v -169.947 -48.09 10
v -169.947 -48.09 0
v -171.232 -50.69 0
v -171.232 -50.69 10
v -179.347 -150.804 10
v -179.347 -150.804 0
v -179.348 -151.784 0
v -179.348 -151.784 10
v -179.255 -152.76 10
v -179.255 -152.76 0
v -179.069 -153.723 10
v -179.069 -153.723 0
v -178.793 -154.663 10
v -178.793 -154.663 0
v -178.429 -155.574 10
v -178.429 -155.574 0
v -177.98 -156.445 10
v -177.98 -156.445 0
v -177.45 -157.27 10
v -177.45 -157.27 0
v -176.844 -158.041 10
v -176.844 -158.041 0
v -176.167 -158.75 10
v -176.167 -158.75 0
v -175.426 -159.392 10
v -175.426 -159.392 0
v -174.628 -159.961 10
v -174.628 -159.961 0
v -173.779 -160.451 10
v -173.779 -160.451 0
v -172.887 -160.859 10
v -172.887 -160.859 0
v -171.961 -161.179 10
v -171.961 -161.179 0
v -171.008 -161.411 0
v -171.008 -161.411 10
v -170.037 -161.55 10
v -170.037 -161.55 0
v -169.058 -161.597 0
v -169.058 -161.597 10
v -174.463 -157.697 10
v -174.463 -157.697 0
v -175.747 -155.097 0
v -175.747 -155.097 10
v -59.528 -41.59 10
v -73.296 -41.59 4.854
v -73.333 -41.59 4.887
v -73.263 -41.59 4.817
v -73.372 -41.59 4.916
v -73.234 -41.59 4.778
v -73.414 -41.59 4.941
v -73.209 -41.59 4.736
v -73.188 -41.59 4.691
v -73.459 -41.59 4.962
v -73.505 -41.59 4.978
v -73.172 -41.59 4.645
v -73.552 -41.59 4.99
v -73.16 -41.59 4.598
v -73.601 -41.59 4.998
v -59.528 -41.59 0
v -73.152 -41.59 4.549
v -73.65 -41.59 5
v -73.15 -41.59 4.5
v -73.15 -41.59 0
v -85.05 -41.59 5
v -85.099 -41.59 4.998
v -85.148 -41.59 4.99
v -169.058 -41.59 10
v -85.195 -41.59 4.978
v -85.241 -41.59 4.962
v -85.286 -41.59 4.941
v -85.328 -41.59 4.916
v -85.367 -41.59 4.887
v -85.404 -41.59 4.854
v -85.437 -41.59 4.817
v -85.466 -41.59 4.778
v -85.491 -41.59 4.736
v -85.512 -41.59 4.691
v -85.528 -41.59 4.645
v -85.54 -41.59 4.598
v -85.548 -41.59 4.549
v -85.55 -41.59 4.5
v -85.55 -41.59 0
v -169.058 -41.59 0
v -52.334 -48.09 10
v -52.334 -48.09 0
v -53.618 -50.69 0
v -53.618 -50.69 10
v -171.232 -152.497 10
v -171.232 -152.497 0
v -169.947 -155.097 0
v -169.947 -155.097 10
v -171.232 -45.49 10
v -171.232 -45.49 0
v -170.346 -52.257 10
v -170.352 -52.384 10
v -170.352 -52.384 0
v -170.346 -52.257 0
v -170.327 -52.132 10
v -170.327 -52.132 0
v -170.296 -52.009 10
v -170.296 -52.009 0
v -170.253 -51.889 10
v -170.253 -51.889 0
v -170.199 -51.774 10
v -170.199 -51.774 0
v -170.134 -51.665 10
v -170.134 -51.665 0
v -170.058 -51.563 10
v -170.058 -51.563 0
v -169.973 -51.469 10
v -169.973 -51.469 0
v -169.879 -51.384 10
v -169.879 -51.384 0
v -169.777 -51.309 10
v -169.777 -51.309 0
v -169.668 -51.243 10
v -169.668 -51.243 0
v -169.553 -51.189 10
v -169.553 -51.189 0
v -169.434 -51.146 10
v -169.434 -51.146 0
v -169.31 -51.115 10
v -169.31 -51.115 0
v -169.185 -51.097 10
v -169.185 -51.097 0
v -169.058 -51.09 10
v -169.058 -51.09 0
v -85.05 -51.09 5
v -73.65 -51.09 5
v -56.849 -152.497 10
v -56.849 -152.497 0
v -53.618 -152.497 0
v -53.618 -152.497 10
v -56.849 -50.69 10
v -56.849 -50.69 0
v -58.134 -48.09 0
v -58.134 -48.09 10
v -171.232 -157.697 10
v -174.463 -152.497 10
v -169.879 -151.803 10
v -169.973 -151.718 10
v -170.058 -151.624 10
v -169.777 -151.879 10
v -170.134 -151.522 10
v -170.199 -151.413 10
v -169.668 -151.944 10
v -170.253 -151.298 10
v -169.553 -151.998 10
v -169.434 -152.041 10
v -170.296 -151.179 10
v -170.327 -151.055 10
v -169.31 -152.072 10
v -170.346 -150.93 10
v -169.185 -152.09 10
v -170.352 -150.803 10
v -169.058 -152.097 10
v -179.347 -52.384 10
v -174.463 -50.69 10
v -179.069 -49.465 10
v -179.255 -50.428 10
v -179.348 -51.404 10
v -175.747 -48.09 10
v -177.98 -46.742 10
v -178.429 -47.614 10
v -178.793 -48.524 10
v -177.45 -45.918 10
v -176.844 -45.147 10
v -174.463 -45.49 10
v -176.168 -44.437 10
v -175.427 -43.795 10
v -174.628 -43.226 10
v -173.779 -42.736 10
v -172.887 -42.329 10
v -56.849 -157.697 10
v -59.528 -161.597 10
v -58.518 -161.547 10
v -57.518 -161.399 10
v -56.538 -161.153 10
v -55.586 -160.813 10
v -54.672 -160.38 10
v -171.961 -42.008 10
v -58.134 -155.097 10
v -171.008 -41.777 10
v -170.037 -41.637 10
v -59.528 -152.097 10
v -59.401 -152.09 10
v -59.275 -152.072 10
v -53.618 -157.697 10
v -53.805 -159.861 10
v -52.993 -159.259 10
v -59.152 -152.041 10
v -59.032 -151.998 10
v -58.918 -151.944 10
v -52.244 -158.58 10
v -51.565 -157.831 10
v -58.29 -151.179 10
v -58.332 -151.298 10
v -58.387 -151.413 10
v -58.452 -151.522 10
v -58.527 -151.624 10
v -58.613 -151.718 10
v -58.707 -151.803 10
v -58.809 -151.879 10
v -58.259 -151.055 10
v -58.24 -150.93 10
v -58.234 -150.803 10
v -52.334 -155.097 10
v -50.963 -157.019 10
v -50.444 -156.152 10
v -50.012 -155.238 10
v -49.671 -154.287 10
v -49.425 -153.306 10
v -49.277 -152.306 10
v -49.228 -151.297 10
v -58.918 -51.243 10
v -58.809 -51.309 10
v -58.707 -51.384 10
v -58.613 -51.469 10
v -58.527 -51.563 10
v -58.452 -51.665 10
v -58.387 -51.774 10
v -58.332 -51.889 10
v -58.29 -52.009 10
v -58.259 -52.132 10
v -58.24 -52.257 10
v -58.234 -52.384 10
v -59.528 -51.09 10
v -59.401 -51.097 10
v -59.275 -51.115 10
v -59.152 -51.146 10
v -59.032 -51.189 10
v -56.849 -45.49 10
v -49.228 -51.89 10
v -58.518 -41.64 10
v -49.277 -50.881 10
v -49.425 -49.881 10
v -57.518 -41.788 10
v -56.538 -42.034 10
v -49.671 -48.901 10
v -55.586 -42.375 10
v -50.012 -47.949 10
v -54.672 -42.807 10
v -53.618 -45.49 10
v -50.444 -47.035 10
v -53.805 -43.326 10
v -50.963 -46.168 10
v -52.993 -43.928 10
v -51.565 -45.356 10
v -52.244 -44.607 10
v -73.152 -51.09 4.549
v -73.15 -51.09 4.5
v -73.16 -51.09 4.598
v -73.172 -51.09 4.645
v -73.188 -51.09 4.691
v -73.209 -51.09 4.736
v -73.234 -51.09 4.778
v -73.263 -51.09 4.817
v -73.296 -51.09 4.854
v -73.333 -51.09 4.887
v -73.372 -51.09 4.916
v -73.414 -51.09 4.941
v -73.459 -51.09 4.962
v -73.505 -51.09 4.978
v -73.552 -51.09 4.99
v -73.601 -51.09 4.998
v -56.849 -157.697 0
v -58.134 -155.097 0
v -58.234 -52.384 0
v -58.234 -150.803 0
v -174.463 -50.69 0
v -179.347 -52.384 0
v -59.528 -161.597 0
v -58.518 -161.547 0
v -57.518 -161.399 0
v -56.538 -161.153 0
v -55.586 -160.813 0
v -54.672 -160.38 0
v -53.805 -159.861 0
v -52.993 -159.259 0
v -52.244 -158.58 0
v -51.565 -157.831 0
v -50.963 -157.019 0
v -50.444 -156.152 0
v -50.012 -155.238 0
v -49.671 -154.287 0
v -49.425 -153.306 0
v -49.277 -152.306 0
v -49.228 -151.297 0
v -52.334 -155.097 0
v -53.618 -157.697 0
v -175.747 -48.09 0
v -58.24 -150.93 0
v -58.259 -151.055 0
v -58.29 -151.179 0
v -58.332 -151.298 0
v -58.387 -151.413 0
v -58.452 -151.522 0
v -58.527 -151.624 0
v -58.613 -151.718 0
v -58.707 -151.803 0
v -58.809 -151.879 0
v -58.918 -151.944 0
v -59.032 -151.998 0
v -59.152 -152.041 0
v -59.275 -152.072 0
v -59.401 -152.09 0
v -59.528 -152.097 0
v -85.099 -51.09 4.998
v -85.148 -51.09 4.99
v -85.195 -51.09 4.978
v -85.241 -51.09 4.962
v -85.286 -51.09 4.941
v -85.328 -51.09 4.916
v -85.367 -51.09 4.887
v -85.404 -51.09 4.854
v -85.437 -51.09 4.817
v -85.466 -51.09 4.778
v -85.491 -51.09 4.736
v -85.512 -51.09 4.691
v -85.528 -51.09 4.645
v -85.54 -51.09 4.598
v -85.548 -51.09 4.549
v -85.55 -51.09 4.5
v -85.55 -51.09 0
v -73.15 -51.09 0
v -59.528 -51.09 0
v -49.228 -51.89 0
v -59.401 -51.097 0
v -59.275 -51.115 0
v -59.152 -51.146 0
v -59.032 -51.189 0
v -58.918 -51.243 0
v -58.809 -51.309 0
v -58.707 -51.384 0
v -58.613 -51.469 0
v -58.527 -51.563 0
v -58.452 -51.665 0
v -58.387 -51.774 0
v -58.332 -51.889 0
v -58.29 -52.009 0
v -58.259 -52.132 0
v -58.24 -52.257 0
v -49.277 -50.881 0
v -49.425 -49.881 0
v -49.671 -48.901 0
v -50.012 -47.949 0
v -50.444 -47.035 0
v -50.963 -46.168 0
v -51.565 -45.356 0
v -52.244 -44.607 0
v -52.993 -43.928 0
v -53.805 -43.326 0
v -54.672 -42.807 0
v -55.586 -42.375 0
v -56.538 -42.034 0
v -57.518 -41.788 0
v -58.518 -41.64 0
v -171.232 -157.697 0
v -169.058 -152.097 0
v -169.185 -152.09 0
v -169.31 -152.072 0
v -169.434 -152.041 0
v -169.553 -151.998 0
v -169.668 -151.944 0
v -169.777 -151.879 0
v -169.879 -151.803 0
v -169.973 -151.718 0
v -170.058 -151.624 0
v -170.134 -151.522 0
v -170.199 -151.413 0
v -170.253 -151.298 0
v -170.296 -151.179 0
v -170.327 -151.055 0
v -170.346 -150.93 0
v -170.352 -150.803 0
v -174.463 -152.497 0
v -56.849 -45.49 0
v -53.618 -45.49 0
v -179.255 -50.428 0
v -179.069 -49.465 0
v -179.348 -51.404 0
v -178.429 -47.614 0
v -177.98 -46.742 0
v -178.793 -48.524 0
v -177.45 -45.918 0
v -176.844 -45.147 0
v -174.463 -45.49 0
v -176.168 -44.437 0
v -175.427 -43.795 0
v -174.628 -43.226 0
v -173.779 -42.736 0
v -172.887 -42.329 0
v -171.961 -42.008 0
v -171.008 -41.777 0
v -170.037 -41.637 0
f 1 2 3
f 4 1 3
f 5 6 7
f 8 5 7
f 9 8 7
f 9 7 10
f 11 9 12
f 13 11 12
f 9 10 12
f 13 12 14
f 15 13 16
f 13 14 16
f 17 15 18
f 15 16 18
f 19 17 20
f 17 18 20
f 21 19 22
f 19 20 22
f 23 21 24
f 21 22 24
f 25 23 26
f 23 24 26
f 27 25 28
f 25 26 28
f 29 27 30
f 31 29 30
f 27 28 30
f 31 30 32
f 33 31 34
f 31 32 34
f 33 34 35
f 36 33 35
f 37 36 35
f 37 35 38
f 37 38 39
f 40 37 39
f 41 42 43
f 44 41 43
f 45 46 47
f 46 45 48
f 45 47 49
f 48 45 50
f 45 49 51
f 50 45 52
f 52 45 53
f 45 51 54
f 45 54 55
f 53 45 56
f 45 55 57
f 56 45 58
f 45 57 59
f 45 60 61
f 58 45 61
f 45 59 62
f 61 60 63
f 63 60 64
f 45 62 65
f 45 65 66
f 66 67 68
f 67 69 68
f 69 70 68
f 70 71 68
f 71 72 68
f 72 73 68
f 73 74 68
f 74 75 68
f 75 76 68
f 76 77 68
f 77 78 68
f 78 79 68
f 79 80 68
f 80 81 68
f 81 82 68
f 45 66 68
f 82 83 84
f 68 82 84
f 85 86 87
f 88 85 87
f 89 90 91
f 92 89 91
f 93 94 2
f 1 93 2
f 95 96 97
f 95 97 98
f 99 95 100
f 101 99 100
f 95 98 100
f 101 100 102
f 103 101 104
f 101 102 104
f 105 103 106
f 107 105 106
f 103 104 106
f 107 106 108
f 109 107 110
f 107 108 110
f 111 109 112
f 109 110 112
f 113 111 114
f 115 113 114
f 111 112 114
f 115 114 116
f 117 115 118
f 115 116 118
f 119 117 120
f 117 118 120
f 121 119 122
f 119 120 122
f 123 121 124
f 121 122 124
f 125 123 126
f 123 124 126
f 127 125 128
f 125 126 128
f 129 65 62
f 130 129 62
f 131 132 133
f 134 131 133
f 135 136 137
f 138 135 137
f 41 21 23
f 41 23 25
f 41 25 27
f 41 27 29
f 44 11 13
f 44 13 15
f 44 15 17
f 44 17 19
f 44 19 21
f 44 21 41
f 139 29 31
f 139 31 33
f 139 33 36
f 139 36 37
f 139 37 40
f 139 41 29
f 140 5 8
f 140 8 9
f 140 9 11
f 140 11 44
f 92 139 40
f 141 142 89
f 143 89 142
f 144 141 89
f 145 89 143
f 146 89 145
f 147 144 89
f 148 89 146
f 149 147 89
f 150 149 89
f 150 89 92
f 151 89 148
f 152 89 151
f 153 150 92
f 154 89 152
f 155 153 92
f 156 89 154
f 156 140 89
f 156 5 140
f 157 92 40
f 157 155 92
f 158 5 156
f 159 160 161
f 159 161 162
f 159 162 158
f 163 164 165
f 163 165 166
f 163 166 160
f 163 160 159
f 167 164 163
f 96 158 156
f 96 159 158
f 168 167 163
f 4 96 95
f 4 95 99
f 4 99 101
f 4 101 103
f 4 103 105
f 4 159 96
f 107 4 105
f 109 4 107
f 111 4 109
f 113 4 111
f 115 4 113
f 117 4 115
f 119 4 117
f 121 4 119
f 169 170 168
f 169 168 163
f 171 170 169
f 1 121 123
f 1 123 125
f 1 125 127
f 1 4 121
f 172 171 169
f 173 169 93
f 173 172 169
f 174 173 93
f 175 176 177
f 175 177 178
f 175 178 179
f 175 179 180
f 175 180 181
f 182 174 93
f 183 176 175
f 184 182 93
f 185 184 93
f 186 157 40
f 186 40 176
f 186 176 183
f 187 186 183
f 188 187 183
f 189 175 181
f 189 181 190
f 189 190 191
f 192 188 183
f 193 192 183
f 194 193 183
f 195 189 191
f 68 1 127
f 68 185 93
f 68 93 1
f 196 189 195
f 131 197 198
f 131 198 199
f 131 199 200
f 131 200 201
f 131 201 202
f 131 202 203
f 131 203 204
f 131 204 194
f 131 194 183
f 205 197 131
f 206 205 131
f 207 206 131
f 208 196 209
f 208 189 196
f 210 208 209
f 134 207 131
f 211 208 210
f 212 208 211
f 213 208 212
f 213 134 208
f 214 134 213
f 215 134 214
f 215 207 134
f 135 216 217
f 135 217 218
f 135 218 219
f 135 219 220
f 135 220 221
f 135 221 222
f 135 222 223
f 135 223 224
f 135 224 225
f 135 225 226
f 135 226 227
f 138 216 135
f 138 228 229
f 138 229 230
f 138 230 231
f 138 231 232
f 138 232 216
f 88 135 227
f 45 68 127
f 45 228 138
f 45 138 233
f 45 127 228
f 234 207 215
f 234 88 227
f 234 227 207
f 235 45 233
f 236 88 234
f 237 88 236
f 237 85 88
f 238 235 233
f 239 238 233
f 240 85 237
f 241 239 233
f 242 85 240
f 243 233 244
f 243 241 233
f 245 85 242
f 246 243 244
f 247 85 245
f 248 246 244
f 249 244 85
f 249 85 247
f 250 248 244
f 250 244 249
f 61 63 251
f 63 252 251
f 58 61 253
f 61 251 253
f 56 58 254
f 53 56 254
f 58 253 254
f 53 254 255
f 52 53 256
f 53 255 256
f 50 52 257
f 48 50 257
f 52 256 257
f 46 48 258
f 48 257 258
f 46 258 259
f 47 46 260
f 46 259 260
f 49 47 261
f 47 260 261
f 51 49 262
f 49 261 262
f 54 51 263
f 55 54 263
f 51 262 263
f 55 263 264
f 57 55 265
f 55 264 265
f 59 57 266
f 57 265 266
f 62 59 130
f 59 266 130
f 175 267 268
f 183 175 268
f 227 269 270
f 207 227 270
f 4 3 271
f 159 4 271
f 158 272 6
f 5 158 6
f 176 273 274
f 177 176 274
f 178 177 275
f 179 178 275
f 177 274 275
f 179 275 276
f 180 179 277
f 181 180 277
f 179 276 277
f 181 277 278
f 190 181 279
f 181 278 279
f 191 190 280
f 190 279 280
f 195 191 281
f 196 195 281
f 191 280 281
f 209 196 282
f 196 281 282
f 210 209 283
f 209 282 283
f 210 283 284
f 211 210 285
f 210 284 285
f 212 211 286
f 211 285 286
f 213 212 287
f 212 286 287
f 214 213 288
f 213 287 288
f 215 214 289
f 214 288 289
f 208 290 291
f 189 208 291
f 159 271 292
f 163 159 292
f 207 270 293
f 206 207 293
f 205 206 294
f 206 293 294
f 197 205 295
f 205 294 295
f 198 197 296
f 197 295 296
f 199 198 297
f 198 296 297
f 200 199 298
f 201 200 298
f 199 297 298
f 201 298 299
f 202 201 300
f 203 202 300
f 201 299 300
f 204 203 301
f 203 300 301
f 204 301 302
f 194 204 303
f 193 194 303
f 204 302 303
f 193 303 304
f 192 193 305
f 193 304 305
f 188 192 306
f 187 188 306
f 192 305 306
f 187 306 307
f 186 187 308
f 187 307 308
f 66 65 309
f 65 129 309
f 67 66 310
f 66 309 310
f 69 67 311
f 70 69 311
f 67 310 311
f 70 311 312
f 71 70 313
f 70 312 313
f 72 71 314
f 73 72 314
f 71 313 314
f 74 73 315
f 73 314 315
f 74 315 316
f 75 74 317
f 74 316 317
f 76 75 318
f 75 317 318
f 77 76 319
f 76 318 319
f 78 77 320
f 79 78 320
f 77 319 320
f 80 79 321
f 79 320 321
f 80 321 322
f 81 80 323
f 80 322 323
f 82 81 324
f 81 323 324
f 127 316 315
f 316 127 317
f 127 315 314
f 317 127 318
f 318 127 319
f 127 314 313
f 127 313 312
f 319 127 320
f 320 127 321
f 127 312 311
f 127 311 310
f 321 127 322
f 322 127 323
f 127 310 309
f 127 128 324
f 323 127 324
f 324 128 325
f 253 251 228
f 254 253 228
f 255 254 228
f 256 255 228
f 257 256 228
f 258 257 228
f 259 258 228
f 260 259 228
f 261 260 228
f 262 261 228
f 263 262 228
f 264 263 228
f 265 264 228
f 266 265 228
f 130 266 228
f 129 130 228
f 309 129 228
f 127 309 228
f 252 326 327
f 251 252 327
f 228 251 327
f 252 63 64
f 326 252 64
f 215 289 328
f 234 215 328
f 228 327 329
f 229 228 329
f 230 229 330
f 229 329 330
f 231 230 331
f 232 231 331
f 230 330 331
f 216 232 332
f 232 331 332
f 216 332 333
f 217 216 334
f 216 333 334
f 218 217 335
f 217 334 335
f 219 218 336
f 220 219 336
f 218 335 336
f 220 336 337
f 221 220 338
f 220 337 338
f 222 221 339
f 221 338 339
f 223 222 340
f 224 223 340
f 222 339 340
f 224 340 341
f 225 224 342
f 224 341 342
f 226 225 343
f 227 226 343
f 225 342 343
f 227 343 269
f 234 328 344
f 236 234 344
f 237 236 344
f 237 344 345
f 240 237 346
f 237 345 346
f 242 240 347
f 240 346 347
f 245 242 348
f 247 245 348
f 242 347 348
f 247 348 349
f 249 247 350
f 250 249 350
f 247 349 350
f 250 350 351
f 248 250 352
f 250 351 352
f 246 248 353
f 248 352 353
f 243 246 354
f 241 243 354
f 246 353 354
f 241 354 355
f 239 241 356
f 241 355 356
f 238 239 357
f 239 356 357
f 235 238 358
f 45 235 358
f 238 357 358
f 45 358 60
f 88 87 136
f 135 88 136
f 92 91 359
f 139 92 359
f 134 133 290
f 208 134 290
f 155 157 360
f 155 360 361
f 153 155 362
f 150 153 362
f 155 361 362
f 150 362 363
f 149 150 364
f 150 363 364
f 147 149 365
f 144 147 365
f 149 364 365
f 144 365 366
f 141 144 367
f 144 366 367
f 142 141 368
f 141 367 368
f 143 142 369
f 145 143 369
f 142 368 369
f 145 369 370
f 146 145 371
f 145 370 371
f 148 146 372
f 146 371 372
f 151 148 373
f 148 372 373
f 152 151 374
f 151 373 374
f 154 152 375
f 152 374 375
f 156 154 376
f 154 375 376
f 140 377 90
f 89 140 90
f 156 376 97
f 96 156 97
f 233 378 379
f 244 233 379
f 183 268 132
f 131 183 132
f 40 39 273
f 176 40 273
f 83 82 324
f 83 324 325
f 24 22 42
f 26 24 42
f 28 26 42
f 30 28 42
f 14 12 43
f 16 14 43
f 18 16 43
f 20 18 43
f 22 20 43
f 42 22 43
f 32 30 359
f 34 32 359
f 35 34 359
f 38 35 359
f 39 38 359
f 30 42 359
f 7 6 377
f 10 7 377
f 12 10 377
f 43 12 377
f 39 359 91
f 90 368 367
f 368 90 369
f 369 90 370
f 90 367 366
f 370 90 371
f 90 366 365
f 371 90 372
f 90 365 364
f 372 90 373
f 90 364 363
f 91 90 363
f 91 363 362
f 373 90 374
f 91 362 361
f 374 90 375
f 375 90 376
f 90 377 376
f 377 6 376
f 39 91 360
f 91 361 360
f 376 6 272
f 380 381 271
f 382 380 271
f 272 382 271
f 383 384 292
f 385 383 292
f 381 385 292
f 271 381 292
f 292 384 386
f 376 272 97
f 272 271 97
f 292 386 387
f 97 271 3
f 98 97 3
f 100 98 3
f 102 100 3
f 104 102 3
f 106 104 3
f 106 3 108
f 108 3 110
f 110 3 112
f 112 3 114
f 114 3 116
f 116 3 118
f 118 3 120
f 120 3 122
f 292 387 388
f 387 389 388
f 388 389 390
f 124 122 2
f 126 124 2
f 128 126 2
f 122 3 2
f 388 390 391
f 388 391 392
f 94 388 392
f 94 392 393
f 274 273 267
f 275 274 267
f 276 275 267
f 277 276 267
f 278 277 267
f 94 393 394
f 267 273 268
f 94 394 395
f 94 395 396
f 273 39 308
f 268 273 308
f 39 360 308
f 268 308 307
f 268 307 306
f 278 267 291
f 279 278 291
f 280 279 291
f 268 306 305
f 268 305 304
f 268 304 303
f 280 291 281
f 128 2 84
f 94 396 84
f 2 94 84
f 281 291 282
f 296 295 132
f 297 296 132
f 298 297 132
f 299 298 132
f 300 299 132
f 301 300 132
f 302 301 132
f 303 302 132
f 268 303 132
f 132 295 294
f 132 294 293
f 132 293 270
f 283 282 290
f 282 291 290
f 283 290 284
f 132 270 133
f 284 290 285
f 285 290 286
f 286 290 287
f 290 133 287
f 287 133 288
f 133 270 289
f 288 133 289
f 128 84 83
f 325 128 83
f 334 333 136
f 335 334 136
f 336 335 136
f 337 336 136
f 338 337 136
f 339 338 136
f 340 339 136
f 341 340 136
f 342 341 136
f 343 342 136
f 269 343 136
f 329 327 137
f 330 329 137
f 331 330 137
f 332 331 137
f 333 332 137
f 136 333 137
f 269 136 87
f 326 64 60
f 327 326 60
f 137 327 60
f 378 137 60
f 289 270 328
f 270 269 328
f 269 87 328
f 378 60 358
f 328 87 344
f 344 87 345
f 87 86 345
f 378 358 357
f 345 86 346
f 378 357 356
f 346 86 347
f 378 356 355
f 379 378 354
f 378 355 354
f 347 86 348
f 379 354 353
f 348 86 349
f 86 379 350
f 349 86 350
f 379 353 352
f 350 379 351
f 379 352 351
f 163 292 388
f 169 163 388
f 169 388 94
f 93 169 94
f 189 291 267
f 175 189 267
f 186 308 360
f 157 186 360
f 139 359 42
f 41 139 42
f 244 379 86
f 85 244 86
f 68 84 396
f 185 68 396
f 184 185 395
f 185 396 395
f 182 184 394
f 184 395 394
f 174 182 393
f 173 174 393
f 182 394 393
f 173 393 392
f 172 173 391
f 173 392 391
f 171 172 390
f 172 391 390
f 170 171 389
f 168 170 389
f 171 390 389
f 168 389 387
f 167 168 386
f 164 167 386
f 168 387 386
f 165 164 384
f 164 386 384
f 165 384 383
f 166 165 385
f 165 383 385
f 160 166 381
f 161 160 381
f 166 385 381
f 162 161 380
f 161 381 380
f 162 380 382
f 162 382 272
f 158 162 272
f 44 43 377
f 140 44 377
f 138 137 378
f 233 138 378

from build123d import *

# Parameters (mm, degrees)
AUFSATZ_LINEAR_AUSTRAGEN1_DEPTH = 10
SCHNITT_LINEAR_AUSTRAGEN1_REACH = 218.035
SKIZZE2_W                       = 12.4
SKIZZE2_H                       = 5
VERRUNDUNG1_R                   = 0.5


with BuildPart() as part:
    # Skizze1 → Aufsatz-Linear austragen1 (new body)
    with BuildSketch(Plane.XY):
        with BuildLine():
            Line((-59.5275, -41.5905), (-73.15, -41.5905))
            Line((-73.15, -41.5905), (-85.55, -41.5905))
            Line((-85.55, -41.5905), (-169.0581, -41.5905))
            ThreePointArc((-169.0581, -41.5905), (-176.514207067, -44.783915623), (-179.34742314, -52.3842))
            Line((-179.34742314, -52.3842), (-179.34742314, -150.803560266))
            ThreePointArc((-179.34742314, -150.803560266), (-176.514004305, -158.403485592), (-169.0581, -161.5967))
            Line((-169.0581, -161.5967), (-59.5275, -161.5967))
            ThreePointArc((-59.5275, -161.5967), (-52.244300154, -158.579899846), (-49.2275, -151.2967))
            Line((-49.2275, -151.2967), (-49.2275, -51.8905))
            ThreePointArc((-49.2275, -51.8905), (-52.244300154, -44.607300154), (-59.5275, -41.5905))
        make_face()
        Polygon((-174.462899882, -152.4967), (-171.231946398, -152.4967), (-169.94742314, -155.0967), (-171.231946398, -157.6967), (-174.462899882, -157.6967), (-175.74742314, -155.0967), align=None, mode=Mode.SUBTRACT)
        Polygon((-58.1338, -155.0967), (-56.849276742, -152.4967), (-53.618323258, -152.4967), (-52.3338, -155.0967), (-53.618323258, -157.6967), (-56.849276742, -157.6967), align=None, mode=Mode.SUBTRACT)
        Polygon((-175.74742314, -48.0905), (-174.462899882, -45.4905), (-171.231946398, -45.4905), (-169.94742314, -48.0905), (-171.231946398, -50.6905), (-174.462899882, -50.6905), align=None, mode=Mode.SUBTRACT)
        with BuildLine():
            Line((-85.55, -51.0905), (-73.15, -51.0905))
            Line((-73.15, -51.0905), (-59.5275, -51.0905))
            ThreePointArc((-59.5275, -51.0905), (-58.612715957, -51.469415957), (-58.2338, -52.3842))
            Line((-58.2338, -52.3842), (-58.2338, -150.803))
            ThreePointArc((-58.2338, -150.803), (-58.612715957, -151.717784043), (-59.5275, -152.0967))
            Line((-59.5275, -152.0967), (-169.0581, -152.0967))
            ThreePointArc((-169.0581, -152.0967), (-169.972884043, -151.717784043), (-170.3518, -150.803))
            Line((-170.3518, -150.803), (-170.3518, -52.3842))
            ThreePointArc((-170.3518, -52.3842), (-169.972884043, -51.469415957), (-169.0581, -51.0905))
            Line((-169.0581, -51.0905), (-85.55, -51.0905))
        make_face(mode=Mode.SUBTRACT)
        Polygon((-58.1338, -48.0905), (-56.849276742, -45.4905), (-53.618323258, -45.4905), (-52.3338, -48.0905), (-53.618323258, -50.6905), (-56.849276742, -50.6905), align=None, mode=Mode.SUBTRACT)
    extrude(amount=AUFSATZ_LINEAR_AUSTRAGEN1_DEPTH)

    # Skizze2 → Schnitt-Linear austragen1 (cut, up to next)
    with BuildSketch(Plane(origin=(0, -41.5905, 0), x_dir=(1, 0, 0), z_dir=(0, 1, 0)), mode=Mode.PRIVATE) as schnitt_linear_austragen1_sk1:
        with Locations((-79.35, -2.5)):
            Rectangle(SKIZZE2_W, SKIZZE2_H)
    schnitt_linear_austragen1_tool1 = extrude(schnitt_linear_austragen1_sk1.sketch, amount=-SCHNITT_LINEAR_AUSTRAGEN1_REACH, mode=Mode.PRIVATE) & part.part
    add(schnitt_linear_austragen1_tool1.solids().sort_by_distance((-79.35, -41.5905, 2.5))[0], mode=Mode.SUBTRACT)

    # Verrundung1
    verrundung1_edges = [part.edges().sort_by_distance(p)[0] for p in [
        (-85.55, -46.3405, 5),
        (-73.15, -46.3405, 5),
    ]]
    fillet(verrundung1_edges, radius=VERRUNDUNG1_R)


solid = part.part
